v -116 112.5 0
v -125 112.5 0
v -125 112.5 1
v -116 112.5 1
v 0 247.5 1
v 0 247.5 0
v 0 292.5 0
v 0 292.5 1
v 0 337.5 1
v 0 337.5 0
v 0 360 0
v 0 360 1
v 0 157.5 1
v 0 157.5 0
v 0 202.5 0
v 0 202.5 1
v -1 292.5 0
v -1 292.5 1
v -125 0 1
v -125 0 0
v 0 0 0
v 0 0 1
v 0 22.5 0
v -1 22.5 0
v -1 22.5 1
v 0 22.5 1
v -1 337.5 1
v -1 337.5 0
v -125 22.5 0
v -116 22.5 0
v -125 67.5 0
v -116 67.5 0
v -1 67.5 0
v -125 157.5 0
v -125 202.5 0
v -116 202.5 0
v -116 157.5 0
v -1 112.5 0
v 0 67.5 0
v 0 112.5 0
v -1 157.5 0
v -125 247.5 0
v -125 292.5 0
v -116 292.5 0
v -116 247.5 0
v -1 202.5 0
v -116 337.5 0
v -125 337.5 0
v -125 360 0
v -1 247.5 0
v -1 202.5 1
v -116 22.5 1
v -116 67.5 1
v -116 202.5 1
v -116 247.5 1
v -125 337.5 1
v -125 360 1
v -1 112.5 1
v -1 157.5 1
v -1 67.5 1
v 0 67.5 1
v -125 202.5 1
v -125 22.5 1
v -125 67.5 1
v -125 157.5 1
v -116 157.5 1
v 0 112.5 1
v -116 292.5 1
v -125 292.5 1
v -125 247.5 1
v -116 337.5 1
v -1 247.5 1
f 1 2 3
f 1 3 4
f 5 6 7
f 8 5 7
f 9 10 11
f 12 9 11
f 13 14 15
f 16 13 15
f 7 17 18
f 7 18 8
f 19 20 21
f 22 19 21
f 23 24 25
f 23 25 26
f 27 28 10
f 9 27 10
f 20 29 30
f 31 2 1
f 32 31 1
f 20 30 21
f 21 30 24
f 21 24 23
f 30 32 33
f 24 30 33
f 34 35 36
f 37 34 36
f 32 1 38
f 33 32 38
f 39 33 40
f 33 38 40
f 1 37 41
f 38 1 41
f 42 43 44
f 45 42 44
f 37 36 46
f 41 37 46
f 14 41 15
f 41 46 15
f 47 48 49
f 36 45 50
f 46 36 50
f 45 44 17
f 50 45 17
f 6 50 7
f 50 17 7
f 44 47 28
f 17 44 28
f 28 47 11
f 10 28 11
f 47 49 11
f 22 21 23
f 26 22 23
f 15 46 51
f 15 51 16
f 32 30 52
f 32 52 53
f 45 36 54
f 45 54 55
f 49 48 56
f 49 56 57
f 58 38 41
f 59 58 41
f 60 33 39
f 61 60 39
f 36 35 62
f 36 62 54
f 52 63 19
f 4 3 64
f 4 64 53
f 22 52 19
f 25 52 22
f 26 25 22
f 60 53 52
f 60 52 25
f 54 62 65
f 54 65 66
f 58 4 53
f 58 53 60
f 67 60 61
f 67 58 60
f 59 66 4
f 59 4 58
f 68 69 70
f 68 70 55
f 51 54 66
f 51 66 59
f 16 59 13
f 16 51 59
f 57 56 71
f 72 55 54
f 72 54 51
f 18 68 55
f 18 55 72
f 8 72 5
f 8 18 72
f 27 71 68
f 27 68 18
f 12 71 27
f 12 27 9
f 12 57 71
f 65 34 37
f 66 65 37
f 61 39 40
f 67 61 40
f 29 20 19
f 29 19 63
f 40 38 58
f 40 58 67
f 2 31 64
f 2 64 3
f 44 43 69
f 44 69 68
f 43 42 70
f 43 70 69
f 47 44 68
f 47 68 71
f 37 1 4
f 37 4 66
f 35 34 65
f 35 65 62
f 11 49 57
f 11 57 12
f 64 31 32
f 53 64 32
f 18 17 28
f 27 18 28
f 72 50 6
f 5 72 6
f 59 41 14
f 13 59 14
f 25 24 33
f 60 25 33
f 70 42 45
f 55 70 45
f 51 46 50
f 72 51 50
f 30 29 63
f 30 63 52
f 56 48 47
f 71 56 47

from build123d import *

# Parameters (mm, degrees)
BOX019_W         = 9
BOX019_H         = 45
BOX019_DEPTH     = 1
ARRAY006_Y_COUNT = 4
ARRAY006_Y_PITCH = 90
BOX017_W         = 1
BOX017_H         = 45
BOX017_DEPTH     = 1
ARRAY005_Y_COUNT = 4
ARRAY005_Y_PITCH = 90
BOX020_W         = 125
BOX020_H         = 360
BOX020_DEPTH     = 1


with BuildPart() as array006:
    # Box019 → Box019 (new body)
    with BuildSketch(Plane(origin=(-125, 0, 0), x_dir=(1, 0, 0), z_dir=(0, 0, 1))):
        with Locations((4.5, 22.5)):
            Rectangle(BOX019_W, BOX019_H)
    extrude(amount=BOX019_DEPTH)

    # Array006 Y: Array006 ×4


with BuildPart() as array006_1:
    add(array006.part)
    with Locations(*[(0, i * ARRAY006_Y_PITCH, 0) for i in range(1, ARRAY006_Y_COUNT)]):
        add(array006.part)


with BuildPart() as array006_2:
    # Array006 placement: moved
    add(array006_1.part.moved(Location((0, 22.5, 0))))


with BuildPart() as array005:
    # Box017 → Box017 (new body)
    with BuildSketch(Plane(origin=(-1, 0, 0), x_dir=(1, 0, 0), z_dir=(0, 0, 1))):
        with Locations((0.5, 22.5)):
            Rectangle(BOX017_W, BOX017_H)
    extrude(amount=BOX017_DEPTH)

    # Array005 Y: Array005 ×4


with BuildPart() as array005_1:
    add(array005.part)
    with Locations(*[(0, i * ARRAY005_Y_PITCH, 0) for i in range(1, ARRAY005_Y_COUNT)]):
        add(array005.part)


with BuildPart() as array005_2:
    # Array005 placement: moved
    add(array005_1.part.moved(Location((0, 22.5, 0))))


with BuildPart() as cut002008005003:
    # Box020 → Box020 (new body)
    with BuildSketch(Plane(origin=(-125, 0, 0), x_dir=(1, 0, 0), z_dir=(0, 0, 1))):
        with Locations((62.5, 180)):
            Rectangle(BOX020_W, BOX020_H)
    extrude(amount=BOX020_DEPTH)

    # Cut002008005004: cut Array005
    add(array005_2.part, mode=Mode.SUBTRACT)

    # Cut002008005003: cut Array006
    add(array006_2.part, mode=Mode.SUBTRACT)


solid = cut002008005003.part
